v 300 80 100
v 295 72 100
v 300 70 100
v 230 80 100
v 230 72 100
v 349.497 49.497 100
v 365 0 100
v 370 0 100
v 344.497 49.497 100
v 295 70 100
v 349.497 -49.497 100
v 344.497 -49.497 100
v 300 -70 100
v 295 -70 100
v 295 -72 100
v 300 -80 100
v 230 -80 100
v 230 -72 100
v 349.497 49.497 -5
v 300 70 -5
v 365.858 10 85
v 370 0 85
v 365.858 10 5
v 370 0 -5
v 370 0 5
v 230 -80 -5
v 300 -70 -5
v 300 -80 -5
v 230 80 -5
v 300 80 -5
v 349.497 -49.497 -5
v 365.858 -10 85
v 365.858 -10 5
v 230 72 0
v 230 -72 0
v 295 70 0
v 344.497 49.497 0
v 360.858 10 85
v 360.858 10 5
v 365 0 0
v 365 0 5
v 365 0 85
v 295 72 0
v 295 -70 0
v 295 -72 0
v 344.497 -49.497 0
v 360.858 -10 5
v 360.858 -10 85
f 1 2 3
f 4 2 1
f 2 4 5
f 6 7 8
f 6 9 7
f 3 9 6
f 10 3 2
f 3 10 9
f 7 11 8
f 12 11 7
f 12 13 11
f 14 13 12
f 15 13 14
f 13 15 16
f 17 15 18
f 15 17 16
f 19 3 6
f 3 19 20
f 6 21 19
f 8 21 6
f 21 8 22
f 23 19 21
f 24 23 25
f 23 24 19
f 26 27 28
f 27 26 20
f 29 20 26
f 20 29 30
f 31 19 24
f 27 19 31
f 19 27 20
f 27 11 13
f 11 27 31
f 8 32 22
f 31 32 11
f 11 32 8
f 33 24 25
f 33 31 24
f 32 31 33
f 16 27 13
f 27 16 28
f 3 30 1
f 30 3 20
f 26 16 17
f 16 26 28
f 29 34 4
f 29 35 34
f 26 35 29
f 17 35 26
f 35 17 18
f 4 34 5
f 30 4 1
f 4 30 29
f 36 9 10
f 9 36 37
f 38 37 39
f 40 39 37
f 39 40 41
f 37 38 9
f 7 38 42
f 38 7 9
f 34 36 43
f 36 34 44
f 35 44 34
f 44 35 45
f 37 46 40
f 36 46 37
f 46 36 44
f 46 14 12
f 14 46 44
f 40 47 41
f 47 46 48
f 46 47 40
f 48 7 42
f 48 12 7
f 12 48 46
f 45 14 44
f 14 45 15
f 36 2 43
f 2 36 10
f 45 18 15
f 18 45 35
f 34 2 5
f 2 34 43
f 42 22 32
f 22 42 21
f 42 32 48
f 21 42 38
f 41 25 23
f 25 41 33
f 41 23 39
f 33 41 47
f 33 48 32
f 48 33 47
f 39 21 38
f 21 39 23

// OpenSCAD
radius = 70;
/*difference(){
    union(){
        linear_extrude(100)
            circle(radius,$fn = 8);
        
        translate([0,-radius,0])
        linear_extrude(100)  
            square([140,radius*2]);
    }
    
    union(){
        translate([5,0,5])
        linear_extrude(100)
            circle(radius,$fn = 8);
        
        translate([5,-radius+5,5])
        linear_extrude(100)  
            square([140,radius*2-10]);
    }
    
    translate([-radius-5,-10,10])
        cube([20,20,80]);
    
}*/



translate([300,0,-5])
rotate([0,0,180])
    difference(){
        union(){
            linear_extrude(105)
                circle(radius,$fn = 8);
            
            translate([0,-radius-10,0])
            linear_extrude(105)  
                square([70,radius*2+20]);
        }

        union(){
            translate([5,0,5])
            linear_extrude(100)
                circle(radius,$fn = 8);
            
            translate([5,-radius-2,5])
            linear_extrude(100)  
                square([70,radius*2+4]);
        }

        translate([-radius-30,-10,10])
            cube([40,20,80]);

}



    
